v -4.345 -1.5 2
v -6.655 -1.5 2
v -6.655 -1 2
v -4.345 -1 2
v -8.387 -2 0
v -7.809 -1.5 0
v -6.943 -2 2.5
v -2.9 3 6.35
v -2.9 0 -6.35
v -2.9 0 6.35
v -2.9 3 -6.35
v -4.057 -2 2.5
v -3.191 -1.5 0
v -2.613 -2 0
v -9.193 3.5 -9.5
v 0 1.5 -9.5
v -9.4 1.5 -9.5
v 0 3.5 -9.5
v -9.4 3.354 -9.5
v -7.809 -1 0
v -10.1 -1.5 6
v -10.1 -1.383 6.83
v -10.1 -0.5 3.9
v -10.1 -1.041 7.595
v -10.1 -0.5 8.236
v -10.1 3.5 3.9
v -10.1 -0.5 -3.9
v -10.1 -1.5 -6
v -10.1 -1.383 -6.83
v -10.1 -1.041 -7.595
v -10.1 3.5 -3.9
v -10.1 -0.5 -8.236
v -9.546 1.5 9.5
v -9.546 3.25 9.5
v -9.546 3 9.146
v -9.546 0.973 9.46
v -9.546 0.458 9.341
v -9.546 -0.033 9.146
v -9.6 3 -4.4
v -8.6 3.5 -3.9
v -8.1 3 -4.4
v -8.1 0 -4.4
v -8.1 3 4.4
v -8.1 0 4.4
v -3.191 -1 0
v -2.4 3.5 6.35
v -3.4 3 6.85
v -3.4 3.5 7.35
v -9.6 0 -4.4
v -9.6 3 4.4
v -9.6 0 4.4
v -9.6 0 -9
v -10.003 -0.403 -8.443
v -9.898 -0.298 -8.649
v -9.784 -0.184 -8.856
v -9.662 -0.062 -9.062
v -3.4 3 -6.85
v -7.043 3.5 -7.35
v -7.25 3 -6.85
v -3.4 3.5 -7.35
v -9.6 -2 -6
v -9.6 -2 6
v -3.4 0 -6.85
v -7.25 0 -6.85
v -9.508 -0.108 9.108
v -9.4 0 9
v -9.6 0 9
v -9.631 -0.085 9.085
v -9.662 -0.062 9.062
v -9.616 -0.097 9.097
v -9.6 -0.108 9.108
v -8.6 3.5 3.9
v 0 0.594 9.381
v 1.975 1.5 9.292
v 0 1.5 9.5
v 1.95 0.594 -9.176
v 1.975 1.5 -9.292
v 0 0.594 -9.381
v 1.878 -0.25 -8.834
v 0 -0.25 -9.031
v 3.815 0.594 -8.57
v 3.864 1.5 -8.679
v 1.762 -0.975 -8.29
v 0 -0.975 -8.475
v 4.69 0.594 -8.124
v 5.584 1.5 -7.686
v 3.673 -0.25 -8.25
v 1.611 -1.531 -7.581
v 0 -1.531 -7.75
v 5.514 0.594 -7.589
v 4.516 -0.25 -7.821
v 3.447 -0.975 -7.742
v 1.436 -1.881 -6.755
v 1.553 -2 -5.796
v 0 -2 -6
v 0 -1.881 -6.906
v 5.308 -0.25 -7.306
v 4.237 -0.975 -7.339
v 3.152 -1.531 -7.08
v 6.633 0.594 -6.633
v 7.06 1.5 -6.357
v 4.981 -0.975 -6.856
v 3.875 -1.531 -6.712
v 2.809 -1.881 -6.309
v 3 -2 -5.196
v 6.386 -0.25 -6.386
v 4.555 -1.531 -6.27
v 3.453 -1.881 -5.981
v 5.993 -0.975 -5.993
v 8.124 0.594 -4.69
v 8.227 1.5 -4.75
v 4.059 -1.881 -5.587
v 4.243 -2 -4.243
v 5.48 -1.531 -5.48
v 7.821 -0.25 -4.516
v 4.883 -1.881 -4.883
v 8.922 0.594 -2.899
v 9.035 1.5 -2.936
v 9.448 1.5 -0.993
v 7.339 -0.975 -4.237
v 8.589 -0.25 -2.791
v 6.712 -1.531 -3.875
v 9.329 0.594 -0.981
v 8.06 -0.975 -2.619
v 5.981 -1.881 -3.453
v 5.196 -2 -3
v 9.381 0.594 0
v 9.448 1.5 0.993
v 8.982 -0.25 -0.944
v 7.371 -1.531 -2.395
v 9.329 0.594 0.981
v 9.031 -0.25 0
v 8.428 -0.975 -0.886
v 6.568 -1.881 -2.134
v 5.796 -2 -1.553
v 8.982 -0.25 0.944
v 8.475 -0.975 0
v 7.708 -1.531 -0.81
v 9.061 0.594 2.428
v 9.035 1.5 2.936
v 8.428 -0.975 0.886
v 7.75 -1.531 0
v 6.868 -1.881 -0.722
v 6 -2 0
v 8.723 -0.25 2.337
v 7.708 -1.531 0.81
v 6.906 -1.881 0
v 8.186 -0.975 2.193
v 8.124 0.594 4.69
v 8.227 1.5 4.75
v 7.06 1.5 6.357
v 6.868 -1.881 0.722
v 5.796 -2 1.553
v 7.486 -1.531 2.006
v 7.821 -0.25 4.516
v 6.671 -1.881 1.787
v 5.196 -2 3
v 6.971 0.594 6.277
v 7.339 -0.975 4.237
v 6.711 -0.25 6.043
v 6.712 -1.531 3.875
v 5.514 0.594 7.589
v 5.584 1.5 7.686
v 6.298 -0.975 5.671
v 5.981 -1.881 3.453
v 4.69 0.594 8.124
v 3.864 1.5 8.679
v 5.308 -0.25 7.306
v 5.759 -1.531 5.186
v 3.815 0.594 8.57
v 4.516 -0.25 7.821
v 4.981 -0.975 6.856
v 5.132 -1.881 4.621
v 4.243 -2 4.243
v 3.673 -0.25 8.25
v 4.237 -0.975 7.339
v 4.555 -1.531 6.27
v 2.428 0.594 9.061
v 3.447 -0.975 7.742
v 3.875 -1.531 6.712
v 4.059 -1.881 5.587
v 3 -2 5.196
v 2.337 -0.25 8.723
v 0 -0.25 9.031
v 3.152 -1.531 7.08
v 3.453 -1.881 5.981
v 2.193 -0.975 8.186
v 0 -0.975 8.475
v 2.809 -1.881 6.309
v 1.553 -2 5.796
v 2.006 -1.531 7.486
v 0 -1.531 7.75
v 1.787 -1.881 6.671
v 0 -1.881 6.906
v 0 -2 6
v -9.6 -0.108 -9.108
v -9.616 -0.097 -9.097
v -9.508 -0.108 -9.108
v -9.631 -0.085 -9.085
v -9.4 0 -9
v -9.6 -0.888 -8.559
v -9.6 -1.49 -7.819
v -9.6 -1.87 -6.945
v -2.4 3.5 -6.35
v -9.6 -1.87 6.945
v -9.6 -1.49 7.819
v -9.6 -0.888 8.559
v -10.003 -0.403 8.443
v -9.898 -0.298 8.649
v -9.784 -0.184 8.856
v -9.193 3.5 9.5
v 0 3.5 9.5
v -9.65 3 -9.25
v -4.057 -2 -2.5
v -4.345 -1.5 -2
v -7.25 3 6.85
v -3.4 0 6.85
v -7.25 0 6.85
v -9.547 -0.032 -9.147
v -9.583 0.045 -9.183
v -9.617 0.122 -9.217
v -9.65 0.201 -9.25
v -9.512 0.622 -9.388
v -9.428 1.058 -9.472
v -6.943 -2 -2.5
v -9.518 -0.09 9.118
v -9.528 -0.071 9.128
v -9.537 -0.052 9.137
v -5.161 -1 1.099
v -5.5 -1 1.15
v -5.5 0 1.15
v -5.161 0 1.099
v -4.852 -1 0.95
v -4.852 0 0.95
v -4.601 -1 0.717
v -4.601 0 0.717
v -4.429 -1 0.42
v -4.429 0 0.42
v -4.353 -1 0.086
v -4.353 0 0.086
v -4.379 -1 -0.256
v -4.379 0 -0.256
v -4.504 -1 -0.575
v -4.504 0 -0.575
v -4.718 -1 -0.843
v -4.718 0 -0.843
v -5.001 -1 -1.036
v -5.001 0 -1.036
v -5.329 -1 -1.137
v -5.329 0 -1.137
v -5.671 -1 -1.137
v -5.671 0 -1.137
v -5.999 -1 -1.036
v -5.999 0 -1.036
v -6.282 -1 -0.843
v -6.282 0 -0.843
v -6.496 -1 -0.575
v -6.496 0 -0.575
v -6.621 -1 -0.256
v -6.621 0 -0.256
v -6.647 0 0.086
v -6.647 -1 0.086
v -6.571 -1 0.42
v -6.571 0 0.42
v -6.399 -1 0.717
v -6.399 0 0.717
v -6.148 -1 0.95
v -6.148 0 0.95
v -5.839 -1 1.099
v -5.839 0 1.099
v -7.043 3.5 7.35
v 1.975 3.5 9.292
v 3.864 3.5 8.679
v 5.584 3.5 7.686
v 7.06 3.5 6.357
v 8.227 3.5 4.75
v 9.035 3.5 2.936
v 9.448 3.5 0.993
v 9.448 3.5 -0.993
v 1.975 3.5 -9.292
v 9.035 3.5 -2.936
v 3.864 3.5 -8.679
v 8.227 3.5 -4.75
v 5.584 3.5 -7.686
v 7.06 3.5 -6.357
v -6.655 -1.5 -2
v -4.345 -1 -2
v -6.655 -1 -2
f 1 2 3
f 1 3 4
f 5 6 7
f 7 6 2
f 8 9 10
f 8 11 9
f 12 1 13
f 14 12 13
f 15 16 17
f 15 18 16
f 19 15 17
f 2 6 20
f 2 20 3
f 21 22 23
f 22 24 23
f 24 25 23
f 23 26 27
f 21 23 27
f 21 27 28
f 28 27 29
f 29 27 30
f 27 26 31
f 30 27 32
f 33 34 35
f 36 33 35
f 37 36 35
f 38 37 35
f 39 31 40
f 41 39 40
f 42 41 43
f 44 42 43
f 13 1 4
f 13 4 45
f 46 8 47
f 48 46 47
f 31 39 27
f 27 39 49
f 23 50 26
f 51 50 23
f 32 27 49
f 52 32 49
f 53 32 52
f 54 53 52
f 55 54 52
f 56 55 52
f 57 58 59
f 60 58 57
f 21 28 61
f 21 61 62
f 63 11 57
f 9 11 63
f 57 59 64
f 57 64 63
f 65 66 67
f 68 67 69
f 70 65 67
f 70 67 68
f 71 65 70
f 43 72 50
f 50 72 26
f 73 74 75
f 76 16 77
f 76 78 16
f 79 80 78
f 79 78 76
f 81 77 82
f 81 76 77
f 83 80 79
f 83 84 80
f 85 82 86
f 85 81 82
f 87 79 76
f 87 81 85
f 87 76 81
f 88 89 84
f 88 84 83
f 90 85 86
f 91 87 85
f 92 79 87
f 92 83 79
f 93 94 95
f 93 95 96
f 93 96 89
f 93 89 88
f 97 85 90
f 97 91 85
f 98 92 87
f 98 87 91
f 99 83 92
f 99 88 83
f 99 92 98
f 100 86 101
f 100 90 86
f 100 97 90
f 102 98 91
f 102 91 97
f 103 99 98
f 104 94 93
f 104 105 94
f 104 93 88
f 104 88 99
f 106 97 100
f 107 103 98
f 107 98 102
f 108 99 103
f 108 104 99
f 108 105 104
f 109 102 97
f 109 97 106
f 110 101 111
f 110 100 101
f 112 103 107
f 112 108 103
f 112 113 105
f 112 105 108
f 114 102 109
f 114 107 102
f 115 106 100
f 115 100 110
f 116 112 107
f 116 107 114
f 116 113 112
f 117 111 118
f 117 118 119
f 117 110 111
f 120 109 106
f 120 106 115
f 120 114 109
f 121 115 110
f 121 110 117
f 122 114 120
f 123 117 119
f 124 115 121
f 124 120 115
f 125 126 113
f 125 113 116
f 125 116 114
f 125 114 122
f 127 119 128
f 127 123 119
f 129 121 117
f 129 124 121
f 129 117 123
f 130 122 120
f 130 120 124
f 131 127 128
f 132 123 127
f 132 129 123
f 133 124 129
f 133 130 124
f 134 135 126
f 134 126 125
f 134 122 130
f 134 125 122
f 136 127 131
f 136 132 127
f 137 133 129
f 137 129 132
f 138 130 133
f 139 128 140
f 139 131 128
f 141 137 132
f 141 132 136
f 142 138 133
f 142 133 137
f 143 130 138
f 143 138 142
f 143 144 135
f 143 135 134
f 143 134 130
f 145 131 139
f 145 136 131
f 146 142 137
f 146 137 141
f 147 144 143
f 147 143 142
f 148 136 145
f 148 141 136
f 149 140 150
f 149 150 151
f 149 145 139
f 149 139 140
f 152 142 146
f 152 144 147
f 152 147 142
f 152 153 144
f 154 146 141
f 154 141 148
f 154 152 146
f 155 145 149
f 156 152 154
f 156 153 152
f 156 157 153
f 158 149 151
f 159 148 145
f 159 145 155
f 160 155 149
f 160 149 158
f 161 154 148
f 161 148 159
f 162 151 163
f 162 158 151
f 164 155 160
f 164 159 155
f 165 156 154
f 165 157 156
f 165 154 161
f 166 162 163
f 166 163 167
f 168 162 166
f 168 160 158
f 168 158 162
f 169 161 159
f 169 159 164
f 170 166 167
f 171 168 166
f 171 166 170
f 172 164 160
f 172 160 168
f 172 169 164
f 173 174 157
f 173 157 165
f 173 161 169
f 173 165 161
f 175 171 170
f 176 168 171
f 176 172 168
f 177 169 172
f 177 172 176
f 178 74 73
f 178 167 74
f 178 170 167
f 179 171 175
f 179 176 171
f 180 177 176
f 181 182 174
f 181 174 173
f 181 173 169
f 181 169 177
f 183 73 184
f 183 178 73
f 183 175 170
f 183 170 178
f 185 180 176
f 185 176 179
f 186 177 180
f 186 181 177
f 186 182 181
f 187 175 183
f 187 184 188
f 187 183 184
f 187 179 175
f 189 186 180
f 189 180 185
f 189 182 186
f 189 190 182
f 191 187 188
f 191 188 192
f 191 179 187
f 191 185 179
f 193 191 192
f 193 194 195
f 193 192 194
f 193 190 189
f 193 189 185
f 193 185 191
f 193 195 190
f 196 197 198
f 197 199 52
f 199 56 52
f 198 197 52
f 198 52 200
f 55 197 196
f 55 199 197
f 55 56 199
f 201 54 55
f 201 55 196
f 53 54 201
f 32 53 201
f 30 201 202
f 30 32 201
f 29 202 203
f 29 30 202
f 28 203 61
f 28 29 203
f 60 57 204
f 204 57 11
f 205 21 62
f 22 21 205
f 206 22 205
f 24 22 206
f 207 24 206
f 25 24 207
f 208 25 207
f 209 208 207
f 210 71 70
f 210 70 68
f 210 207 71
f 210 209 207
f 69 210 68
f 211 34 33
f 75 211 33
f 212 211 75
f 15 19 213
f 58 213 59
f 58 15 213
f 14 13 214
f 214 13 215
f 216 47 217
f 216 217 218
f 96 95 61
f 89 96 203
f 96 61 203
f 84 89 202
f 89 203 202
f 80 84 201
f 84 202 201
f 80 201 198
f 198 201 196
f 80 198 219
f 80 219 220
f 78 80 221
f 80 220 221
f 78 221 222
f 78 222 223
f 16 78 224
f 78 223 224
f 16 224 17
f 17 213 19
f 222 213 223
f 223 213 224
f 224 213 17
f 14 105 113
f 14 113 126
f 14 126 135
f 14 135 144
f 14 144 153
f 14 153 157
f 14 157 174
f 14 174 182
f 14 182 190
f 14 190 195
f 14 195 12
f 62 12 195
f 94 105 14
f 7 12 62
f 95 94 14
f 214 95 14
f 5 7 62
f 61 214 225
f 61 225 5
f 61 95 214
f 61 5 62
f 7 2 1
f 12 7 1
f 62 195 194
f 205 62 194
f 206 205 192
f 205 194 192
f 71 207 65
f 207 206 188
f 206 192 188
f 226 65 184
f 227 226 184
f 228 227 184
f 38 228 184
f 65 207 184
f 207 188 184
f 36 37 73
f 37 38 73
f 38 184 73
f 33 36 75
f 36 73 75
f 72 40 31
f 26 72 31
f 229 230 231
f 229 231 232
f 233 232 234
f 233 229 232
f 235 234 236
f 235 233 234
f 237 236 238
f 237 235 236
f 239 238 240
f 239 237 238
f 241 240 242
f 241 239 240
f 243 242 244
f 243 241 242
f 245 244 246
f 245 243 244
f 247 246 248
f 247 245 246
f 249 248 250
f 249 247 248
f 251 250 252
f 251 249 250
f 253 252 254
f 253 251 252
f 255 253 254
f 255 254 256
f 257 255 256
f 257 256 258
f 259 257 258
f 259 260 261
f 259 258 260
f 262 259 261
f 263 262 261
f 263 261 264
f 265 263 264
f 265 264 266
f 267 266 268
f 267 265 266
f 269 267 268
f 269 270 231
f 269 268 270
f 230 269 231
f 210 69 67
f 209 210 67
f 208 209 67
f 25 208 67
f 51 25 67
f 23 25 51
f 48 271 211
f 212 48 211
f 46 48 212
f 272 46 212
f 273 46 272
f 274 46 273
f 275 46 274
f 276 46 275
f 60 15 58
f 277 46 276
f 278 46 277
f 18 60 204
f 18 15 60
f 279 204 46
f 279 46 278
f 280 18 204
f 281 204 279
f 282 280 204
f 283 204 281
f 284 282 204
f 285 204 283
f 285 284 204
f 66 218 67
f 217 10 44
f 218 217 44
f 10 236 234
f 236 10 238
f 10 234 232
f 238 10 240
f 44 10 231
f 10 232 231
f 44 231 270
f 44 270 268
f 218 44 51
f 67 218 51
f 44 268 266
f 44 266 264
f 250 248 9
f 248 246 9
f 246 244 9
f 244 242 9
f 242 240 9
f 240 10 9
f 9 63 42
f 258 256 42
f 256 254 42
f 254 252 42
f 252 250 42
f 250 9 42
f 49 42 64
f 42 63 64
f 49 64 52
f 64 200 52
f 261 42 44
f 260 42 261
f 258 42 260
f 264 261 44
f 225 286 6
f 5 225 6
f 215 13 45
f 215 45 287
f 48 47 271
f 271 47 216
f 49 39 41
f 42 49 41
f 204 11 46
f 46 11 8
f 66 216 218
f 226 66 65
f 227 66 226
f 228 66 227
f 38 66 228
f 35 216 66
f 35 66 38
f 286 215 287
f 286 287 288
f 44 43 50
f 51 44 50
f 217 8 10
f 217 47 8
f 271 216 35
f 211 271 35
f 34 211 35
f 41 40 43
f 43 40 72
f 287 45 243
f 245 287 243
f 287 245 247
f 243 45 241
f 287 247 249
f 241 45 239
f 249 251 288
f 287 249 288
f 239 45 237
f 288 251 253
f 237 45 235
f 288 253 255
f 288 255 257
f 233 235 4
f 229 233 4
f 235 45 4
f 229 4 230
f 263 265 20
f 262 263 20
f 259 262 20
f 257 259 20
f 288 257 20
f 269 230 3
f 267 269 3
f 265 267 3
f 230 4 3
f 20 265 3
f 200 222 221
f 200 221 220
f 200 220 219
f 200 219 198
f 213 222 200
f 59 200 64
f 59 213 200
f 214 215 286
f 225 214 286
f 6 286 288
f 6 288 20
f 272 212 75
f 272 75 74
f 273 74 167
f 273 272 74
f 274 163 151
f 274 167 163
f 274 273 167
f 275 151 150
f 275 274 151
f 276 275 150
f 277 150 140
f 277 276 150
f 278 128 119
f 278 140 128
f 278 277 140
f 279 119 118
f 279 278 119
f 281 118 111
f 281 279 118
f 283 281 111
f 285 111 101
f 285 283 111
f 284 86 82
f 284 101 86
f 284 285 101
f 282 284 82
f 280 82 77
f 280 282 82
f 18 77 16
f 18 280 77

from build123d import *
from OCP.BRepFilletAPI import BRepFilletAPI_MakeChamfer

# Parameters (mm, degrees)
BOSS_EXTRUDE1_DEPTH     = 2
BOSS_EXTRUDE2_START     = 3.5
BOSS_EXTRUDE2_DEPTH     = 3.5
CUT_EXTRUDE1_DEPTH      = 15.300699284
CUT_EXTRUDE1_DEPTH_BACK = 15.300699284
SKETCH4_R               = 1.15
CUT_EXTRUDE2_DEPTH      = 1
CHAMFER1_SIZE           = 0.5
CHAMFER1_SIZE2          = 0.353553391
FILLET1_R               = 3.5
CHAMFER2_SIZE           = 0.5


with BuildPart() as part:
    # Sketch1 → Boss-Extrude1 (new body)
    with BuildSketch(Plane(origin=(0, 0, 0), x_dir=(1, 0, 0), z_dir=(0, 1, 0))):
        with BuildLine():
            Line((-10.1, -4.5), (-10.1, 4.5))
            Line((-10.1, 4.5), (-10.1, 9.5))
            Line((-10.1, 9.5), (0, 9.5))
            ThreePointArc((0, 9.5), (9.5, 0), (0, -9.5))
            Line((0, -9.5), (-10.1, -9.5))
            Line((-10.1, -9.5), (-10.1, -4.5))
        make_face()
    extrude(amount=-BOSS_EXTRUDE1_DEPTH)

    # Sketch2 → Boss-Extrude2 (add)
    with BuildSketch(Plane(origin=(0, 0, 0), x_dir=(1, 0, 0), z_dir=(0, 1, 0)).offset(BOSS_EXTRUDE2_START)):
        Polygon((-10.1, 4.4), (-8.1, 4.4), (-8.1, -4.4), (-10.1, -4.4), (-10.1, 0), align=None)
        with BuildLine():
            Line((-9.9, 9.5), (-7.25, 6.85))
            Line((-7.25, 6.85), (-2.9, 6.85))
            Line((-2.9, 6.85), (-2.9, -6.85))
            Line((-2.9, -6.85), (-7.25, -6.85))
            Line((-7.25, -6.85), (-9.9, -9.5))
            Line((-9.9, -9.5), (0, -9.5))
            ThreePointArc((0, -9.5), (9.5, 0), (0, 9.5))
            Line((0, 9.5), (-9.9, 9.5))
        make_face()
    extrude(amount=-BOSS_EXTRUDE2_DEPTH)

    # Sketch4 → Cut-Extrude1 (cut, two sides: drawn at the far end of the back side and taken through both)
    with BuildSketch(Plane(origin=(0, 0, 0), x_dir=(1, 0, 0), z_dir=(0, 1, 0)).offset(-CUT_EXTRUDE1_DEPTH_BACK)):
        with Locations(Location((-5.5, 0, 0), (0, 0, 270))):
            Circle(SKETCH4_R)
    extrude(amount=CUT_EXTRUDE1_DEPTH + CUT_EXTRUDE1_DEPTH_BACK, mode=Mode.SUBTRACT)

    # Sketch14 → Cut-Extrude2 (cut)
    with BuildSketch(Plane.XZ.offset(2)):
        Polygon((-6.654700538, 2), (-4.345299462, 2), (-3.190598923, 0), (-4.345299462, -2), (-6.654700538, -2), (-7.809401077, 0), align=None)
    extrude(amount=-CUT_EXTRUDE2_DEPTH, mode=Mode.SUBTRACT)

    # Chamfer1: one chamfer whose edges measure the first distance from different faces: ONE call of the kernel's chamfer builder (chamfer() names one face for all edges)
    chamfer1_edges_1 = [part.edges().sort_by_distance(p)[0] for p in [
        (-10.1, 0, 6.95),
        (-10.1, 1.75, -4.4),
        (-10.1, 1.75, 4.4),
        (-9.1, 3.5, 4.4),
        (-8.1, 3.5, 0),
        (-9.1, 3.5, -4.4),
        (-10, 0, -9.5),
        (-2.9, 1.75, -6.85),
        (-2.9, 1.75, 6.85),
        (-8.575, 3.5, -8.175),
        (-5.075, 3.5, -6.85),
        (-2.9, 3.5, 0),
        (-5.075, 3.5, 6.85),
        (-8.575, 3.5, 8.175),
        (-7.232050808, -2, 1),
        (-7.232050808, -2, -1),
        (-5.5, -2, -2),
        (-3.767949192, -2, -1),
        (-3.767949192, -2, 1),
        (-5.5, -2, 2),
        (-10, 0, 9.5),
        (-10.1, 0, -6.95),
    ]]
    chamfer1_edges_2 = [part.edges().sort_by_distance(p)[0] for p in [
        (-9.9, 1.75, -9.5),
    ]]
    chamfer1_side_2 = [part.faces().sort_by_distance(p)[0] for p in [
        (-4.986827712, 0.737237922, -9.5),
    ]]
    chamfer1_edges_3 = [part.edges().sort_by_distance(p)[0] for p in [
        (-9.9, 1.75, 9.5),
    ]]
    chamfer1_side_3 = [part.faces().sort_by_distance(p)[0] for p in [
        (-8.575, 1.75, 8.175),
    ]]
    chamfer1 = BRepFilletAPI_MakeChamfer(part.part.solid().wrapped)
    for e in chamfer1_edges_1:
        chamfer1.Add(CHAMFER1_SIZE, e.wrapped)
    for e in chamfer1_edges_2:
        chamfer1.Add(CHAMFER1_SIZE, CHAMFER1_SIZE2, e.wrapped, chamfer1_side_2[0].wrapped)  # the first distance lies on this face
    for e in chamfer1_edges_3:
        chamfer1.Add(CHAMFER1_SIZE, CHAMFER1_SIZE2, e.wrapped, chamfer1_side_3[0].wrapped)  # the first distance lies on this face
    add(Compound.cast(chamfer1.Shape()), mode=Mode.REPLACE)

    # Fillet1
    # the kernel refuses this fillet: 3.5 mm, written as the material it takes off along each edge
    with BuildSketch(Plane(origin=(0, -2, 9.5), x_dir=(0, 1, 0), z_dir=(-1, 0, 0))) as fillet1_piece_1:
        with BuildLine():
            CenterArc((FILLET1_R, FILLET1_R), FILLET1_R, 180, 90)
            Line((0, FILLET1_R), (0, 0))
            Line((0, 0), (FILLET1_R, 0))
        make_face()
    extrude(amount=18.85, mode=Mode.SUBTRACT)
    with BuildSketch(Plane(origin=(-18.85, -2, -9.5), x_dir=(0, 0, 1), z_dir=(1, 0, 0))) as fillet1_piece_2:
        with BuildLine():
            CenterArc((FILLET1_R, -FILLET1_R), FILLET1_R, 90, 90)
            Line((0, -FILLET1_R), (0, 0))
            Line((0, 0), (FILLET1_R, 0))
        make_face()
    extrude(amount=18.85, mode=Mode.SUBTRACT)
    with BuildSketch(Plane(origin=(0, -2, 0), x_dir=(0, 0, -1), z_dir=(-1, 0, 0))) as fillet1_piece_3:
        with BuildLine():
            CenterArc((9.5 - FILLET1_R, -FILLET1_R), FILLET1_R, 0, 90)
            Line((9.5, -FILLET1_R), (9.5, 0))
            Line((9.5, 0), (9.5 - FILLET1_R, 0))
        make_face()
    revolve(axis=Axis((0, -2, 0), (0, -1, 0)), revolution_arc=180, mode=Mode.SUBTRACT)

    # Chamfer2
    chamfer2_edges = [part.edges().sort_by_distance(p)[0] for p in [
        (-10.1, -1.602418411, -7.620185175),
        (-10.1, -1.602418411, 7.620185175),
        (-10.1, -2, 0),
    ]]
    chamfer(chamfer2_edges, length=CHAMFER2_SIZE)


solid = part.part
